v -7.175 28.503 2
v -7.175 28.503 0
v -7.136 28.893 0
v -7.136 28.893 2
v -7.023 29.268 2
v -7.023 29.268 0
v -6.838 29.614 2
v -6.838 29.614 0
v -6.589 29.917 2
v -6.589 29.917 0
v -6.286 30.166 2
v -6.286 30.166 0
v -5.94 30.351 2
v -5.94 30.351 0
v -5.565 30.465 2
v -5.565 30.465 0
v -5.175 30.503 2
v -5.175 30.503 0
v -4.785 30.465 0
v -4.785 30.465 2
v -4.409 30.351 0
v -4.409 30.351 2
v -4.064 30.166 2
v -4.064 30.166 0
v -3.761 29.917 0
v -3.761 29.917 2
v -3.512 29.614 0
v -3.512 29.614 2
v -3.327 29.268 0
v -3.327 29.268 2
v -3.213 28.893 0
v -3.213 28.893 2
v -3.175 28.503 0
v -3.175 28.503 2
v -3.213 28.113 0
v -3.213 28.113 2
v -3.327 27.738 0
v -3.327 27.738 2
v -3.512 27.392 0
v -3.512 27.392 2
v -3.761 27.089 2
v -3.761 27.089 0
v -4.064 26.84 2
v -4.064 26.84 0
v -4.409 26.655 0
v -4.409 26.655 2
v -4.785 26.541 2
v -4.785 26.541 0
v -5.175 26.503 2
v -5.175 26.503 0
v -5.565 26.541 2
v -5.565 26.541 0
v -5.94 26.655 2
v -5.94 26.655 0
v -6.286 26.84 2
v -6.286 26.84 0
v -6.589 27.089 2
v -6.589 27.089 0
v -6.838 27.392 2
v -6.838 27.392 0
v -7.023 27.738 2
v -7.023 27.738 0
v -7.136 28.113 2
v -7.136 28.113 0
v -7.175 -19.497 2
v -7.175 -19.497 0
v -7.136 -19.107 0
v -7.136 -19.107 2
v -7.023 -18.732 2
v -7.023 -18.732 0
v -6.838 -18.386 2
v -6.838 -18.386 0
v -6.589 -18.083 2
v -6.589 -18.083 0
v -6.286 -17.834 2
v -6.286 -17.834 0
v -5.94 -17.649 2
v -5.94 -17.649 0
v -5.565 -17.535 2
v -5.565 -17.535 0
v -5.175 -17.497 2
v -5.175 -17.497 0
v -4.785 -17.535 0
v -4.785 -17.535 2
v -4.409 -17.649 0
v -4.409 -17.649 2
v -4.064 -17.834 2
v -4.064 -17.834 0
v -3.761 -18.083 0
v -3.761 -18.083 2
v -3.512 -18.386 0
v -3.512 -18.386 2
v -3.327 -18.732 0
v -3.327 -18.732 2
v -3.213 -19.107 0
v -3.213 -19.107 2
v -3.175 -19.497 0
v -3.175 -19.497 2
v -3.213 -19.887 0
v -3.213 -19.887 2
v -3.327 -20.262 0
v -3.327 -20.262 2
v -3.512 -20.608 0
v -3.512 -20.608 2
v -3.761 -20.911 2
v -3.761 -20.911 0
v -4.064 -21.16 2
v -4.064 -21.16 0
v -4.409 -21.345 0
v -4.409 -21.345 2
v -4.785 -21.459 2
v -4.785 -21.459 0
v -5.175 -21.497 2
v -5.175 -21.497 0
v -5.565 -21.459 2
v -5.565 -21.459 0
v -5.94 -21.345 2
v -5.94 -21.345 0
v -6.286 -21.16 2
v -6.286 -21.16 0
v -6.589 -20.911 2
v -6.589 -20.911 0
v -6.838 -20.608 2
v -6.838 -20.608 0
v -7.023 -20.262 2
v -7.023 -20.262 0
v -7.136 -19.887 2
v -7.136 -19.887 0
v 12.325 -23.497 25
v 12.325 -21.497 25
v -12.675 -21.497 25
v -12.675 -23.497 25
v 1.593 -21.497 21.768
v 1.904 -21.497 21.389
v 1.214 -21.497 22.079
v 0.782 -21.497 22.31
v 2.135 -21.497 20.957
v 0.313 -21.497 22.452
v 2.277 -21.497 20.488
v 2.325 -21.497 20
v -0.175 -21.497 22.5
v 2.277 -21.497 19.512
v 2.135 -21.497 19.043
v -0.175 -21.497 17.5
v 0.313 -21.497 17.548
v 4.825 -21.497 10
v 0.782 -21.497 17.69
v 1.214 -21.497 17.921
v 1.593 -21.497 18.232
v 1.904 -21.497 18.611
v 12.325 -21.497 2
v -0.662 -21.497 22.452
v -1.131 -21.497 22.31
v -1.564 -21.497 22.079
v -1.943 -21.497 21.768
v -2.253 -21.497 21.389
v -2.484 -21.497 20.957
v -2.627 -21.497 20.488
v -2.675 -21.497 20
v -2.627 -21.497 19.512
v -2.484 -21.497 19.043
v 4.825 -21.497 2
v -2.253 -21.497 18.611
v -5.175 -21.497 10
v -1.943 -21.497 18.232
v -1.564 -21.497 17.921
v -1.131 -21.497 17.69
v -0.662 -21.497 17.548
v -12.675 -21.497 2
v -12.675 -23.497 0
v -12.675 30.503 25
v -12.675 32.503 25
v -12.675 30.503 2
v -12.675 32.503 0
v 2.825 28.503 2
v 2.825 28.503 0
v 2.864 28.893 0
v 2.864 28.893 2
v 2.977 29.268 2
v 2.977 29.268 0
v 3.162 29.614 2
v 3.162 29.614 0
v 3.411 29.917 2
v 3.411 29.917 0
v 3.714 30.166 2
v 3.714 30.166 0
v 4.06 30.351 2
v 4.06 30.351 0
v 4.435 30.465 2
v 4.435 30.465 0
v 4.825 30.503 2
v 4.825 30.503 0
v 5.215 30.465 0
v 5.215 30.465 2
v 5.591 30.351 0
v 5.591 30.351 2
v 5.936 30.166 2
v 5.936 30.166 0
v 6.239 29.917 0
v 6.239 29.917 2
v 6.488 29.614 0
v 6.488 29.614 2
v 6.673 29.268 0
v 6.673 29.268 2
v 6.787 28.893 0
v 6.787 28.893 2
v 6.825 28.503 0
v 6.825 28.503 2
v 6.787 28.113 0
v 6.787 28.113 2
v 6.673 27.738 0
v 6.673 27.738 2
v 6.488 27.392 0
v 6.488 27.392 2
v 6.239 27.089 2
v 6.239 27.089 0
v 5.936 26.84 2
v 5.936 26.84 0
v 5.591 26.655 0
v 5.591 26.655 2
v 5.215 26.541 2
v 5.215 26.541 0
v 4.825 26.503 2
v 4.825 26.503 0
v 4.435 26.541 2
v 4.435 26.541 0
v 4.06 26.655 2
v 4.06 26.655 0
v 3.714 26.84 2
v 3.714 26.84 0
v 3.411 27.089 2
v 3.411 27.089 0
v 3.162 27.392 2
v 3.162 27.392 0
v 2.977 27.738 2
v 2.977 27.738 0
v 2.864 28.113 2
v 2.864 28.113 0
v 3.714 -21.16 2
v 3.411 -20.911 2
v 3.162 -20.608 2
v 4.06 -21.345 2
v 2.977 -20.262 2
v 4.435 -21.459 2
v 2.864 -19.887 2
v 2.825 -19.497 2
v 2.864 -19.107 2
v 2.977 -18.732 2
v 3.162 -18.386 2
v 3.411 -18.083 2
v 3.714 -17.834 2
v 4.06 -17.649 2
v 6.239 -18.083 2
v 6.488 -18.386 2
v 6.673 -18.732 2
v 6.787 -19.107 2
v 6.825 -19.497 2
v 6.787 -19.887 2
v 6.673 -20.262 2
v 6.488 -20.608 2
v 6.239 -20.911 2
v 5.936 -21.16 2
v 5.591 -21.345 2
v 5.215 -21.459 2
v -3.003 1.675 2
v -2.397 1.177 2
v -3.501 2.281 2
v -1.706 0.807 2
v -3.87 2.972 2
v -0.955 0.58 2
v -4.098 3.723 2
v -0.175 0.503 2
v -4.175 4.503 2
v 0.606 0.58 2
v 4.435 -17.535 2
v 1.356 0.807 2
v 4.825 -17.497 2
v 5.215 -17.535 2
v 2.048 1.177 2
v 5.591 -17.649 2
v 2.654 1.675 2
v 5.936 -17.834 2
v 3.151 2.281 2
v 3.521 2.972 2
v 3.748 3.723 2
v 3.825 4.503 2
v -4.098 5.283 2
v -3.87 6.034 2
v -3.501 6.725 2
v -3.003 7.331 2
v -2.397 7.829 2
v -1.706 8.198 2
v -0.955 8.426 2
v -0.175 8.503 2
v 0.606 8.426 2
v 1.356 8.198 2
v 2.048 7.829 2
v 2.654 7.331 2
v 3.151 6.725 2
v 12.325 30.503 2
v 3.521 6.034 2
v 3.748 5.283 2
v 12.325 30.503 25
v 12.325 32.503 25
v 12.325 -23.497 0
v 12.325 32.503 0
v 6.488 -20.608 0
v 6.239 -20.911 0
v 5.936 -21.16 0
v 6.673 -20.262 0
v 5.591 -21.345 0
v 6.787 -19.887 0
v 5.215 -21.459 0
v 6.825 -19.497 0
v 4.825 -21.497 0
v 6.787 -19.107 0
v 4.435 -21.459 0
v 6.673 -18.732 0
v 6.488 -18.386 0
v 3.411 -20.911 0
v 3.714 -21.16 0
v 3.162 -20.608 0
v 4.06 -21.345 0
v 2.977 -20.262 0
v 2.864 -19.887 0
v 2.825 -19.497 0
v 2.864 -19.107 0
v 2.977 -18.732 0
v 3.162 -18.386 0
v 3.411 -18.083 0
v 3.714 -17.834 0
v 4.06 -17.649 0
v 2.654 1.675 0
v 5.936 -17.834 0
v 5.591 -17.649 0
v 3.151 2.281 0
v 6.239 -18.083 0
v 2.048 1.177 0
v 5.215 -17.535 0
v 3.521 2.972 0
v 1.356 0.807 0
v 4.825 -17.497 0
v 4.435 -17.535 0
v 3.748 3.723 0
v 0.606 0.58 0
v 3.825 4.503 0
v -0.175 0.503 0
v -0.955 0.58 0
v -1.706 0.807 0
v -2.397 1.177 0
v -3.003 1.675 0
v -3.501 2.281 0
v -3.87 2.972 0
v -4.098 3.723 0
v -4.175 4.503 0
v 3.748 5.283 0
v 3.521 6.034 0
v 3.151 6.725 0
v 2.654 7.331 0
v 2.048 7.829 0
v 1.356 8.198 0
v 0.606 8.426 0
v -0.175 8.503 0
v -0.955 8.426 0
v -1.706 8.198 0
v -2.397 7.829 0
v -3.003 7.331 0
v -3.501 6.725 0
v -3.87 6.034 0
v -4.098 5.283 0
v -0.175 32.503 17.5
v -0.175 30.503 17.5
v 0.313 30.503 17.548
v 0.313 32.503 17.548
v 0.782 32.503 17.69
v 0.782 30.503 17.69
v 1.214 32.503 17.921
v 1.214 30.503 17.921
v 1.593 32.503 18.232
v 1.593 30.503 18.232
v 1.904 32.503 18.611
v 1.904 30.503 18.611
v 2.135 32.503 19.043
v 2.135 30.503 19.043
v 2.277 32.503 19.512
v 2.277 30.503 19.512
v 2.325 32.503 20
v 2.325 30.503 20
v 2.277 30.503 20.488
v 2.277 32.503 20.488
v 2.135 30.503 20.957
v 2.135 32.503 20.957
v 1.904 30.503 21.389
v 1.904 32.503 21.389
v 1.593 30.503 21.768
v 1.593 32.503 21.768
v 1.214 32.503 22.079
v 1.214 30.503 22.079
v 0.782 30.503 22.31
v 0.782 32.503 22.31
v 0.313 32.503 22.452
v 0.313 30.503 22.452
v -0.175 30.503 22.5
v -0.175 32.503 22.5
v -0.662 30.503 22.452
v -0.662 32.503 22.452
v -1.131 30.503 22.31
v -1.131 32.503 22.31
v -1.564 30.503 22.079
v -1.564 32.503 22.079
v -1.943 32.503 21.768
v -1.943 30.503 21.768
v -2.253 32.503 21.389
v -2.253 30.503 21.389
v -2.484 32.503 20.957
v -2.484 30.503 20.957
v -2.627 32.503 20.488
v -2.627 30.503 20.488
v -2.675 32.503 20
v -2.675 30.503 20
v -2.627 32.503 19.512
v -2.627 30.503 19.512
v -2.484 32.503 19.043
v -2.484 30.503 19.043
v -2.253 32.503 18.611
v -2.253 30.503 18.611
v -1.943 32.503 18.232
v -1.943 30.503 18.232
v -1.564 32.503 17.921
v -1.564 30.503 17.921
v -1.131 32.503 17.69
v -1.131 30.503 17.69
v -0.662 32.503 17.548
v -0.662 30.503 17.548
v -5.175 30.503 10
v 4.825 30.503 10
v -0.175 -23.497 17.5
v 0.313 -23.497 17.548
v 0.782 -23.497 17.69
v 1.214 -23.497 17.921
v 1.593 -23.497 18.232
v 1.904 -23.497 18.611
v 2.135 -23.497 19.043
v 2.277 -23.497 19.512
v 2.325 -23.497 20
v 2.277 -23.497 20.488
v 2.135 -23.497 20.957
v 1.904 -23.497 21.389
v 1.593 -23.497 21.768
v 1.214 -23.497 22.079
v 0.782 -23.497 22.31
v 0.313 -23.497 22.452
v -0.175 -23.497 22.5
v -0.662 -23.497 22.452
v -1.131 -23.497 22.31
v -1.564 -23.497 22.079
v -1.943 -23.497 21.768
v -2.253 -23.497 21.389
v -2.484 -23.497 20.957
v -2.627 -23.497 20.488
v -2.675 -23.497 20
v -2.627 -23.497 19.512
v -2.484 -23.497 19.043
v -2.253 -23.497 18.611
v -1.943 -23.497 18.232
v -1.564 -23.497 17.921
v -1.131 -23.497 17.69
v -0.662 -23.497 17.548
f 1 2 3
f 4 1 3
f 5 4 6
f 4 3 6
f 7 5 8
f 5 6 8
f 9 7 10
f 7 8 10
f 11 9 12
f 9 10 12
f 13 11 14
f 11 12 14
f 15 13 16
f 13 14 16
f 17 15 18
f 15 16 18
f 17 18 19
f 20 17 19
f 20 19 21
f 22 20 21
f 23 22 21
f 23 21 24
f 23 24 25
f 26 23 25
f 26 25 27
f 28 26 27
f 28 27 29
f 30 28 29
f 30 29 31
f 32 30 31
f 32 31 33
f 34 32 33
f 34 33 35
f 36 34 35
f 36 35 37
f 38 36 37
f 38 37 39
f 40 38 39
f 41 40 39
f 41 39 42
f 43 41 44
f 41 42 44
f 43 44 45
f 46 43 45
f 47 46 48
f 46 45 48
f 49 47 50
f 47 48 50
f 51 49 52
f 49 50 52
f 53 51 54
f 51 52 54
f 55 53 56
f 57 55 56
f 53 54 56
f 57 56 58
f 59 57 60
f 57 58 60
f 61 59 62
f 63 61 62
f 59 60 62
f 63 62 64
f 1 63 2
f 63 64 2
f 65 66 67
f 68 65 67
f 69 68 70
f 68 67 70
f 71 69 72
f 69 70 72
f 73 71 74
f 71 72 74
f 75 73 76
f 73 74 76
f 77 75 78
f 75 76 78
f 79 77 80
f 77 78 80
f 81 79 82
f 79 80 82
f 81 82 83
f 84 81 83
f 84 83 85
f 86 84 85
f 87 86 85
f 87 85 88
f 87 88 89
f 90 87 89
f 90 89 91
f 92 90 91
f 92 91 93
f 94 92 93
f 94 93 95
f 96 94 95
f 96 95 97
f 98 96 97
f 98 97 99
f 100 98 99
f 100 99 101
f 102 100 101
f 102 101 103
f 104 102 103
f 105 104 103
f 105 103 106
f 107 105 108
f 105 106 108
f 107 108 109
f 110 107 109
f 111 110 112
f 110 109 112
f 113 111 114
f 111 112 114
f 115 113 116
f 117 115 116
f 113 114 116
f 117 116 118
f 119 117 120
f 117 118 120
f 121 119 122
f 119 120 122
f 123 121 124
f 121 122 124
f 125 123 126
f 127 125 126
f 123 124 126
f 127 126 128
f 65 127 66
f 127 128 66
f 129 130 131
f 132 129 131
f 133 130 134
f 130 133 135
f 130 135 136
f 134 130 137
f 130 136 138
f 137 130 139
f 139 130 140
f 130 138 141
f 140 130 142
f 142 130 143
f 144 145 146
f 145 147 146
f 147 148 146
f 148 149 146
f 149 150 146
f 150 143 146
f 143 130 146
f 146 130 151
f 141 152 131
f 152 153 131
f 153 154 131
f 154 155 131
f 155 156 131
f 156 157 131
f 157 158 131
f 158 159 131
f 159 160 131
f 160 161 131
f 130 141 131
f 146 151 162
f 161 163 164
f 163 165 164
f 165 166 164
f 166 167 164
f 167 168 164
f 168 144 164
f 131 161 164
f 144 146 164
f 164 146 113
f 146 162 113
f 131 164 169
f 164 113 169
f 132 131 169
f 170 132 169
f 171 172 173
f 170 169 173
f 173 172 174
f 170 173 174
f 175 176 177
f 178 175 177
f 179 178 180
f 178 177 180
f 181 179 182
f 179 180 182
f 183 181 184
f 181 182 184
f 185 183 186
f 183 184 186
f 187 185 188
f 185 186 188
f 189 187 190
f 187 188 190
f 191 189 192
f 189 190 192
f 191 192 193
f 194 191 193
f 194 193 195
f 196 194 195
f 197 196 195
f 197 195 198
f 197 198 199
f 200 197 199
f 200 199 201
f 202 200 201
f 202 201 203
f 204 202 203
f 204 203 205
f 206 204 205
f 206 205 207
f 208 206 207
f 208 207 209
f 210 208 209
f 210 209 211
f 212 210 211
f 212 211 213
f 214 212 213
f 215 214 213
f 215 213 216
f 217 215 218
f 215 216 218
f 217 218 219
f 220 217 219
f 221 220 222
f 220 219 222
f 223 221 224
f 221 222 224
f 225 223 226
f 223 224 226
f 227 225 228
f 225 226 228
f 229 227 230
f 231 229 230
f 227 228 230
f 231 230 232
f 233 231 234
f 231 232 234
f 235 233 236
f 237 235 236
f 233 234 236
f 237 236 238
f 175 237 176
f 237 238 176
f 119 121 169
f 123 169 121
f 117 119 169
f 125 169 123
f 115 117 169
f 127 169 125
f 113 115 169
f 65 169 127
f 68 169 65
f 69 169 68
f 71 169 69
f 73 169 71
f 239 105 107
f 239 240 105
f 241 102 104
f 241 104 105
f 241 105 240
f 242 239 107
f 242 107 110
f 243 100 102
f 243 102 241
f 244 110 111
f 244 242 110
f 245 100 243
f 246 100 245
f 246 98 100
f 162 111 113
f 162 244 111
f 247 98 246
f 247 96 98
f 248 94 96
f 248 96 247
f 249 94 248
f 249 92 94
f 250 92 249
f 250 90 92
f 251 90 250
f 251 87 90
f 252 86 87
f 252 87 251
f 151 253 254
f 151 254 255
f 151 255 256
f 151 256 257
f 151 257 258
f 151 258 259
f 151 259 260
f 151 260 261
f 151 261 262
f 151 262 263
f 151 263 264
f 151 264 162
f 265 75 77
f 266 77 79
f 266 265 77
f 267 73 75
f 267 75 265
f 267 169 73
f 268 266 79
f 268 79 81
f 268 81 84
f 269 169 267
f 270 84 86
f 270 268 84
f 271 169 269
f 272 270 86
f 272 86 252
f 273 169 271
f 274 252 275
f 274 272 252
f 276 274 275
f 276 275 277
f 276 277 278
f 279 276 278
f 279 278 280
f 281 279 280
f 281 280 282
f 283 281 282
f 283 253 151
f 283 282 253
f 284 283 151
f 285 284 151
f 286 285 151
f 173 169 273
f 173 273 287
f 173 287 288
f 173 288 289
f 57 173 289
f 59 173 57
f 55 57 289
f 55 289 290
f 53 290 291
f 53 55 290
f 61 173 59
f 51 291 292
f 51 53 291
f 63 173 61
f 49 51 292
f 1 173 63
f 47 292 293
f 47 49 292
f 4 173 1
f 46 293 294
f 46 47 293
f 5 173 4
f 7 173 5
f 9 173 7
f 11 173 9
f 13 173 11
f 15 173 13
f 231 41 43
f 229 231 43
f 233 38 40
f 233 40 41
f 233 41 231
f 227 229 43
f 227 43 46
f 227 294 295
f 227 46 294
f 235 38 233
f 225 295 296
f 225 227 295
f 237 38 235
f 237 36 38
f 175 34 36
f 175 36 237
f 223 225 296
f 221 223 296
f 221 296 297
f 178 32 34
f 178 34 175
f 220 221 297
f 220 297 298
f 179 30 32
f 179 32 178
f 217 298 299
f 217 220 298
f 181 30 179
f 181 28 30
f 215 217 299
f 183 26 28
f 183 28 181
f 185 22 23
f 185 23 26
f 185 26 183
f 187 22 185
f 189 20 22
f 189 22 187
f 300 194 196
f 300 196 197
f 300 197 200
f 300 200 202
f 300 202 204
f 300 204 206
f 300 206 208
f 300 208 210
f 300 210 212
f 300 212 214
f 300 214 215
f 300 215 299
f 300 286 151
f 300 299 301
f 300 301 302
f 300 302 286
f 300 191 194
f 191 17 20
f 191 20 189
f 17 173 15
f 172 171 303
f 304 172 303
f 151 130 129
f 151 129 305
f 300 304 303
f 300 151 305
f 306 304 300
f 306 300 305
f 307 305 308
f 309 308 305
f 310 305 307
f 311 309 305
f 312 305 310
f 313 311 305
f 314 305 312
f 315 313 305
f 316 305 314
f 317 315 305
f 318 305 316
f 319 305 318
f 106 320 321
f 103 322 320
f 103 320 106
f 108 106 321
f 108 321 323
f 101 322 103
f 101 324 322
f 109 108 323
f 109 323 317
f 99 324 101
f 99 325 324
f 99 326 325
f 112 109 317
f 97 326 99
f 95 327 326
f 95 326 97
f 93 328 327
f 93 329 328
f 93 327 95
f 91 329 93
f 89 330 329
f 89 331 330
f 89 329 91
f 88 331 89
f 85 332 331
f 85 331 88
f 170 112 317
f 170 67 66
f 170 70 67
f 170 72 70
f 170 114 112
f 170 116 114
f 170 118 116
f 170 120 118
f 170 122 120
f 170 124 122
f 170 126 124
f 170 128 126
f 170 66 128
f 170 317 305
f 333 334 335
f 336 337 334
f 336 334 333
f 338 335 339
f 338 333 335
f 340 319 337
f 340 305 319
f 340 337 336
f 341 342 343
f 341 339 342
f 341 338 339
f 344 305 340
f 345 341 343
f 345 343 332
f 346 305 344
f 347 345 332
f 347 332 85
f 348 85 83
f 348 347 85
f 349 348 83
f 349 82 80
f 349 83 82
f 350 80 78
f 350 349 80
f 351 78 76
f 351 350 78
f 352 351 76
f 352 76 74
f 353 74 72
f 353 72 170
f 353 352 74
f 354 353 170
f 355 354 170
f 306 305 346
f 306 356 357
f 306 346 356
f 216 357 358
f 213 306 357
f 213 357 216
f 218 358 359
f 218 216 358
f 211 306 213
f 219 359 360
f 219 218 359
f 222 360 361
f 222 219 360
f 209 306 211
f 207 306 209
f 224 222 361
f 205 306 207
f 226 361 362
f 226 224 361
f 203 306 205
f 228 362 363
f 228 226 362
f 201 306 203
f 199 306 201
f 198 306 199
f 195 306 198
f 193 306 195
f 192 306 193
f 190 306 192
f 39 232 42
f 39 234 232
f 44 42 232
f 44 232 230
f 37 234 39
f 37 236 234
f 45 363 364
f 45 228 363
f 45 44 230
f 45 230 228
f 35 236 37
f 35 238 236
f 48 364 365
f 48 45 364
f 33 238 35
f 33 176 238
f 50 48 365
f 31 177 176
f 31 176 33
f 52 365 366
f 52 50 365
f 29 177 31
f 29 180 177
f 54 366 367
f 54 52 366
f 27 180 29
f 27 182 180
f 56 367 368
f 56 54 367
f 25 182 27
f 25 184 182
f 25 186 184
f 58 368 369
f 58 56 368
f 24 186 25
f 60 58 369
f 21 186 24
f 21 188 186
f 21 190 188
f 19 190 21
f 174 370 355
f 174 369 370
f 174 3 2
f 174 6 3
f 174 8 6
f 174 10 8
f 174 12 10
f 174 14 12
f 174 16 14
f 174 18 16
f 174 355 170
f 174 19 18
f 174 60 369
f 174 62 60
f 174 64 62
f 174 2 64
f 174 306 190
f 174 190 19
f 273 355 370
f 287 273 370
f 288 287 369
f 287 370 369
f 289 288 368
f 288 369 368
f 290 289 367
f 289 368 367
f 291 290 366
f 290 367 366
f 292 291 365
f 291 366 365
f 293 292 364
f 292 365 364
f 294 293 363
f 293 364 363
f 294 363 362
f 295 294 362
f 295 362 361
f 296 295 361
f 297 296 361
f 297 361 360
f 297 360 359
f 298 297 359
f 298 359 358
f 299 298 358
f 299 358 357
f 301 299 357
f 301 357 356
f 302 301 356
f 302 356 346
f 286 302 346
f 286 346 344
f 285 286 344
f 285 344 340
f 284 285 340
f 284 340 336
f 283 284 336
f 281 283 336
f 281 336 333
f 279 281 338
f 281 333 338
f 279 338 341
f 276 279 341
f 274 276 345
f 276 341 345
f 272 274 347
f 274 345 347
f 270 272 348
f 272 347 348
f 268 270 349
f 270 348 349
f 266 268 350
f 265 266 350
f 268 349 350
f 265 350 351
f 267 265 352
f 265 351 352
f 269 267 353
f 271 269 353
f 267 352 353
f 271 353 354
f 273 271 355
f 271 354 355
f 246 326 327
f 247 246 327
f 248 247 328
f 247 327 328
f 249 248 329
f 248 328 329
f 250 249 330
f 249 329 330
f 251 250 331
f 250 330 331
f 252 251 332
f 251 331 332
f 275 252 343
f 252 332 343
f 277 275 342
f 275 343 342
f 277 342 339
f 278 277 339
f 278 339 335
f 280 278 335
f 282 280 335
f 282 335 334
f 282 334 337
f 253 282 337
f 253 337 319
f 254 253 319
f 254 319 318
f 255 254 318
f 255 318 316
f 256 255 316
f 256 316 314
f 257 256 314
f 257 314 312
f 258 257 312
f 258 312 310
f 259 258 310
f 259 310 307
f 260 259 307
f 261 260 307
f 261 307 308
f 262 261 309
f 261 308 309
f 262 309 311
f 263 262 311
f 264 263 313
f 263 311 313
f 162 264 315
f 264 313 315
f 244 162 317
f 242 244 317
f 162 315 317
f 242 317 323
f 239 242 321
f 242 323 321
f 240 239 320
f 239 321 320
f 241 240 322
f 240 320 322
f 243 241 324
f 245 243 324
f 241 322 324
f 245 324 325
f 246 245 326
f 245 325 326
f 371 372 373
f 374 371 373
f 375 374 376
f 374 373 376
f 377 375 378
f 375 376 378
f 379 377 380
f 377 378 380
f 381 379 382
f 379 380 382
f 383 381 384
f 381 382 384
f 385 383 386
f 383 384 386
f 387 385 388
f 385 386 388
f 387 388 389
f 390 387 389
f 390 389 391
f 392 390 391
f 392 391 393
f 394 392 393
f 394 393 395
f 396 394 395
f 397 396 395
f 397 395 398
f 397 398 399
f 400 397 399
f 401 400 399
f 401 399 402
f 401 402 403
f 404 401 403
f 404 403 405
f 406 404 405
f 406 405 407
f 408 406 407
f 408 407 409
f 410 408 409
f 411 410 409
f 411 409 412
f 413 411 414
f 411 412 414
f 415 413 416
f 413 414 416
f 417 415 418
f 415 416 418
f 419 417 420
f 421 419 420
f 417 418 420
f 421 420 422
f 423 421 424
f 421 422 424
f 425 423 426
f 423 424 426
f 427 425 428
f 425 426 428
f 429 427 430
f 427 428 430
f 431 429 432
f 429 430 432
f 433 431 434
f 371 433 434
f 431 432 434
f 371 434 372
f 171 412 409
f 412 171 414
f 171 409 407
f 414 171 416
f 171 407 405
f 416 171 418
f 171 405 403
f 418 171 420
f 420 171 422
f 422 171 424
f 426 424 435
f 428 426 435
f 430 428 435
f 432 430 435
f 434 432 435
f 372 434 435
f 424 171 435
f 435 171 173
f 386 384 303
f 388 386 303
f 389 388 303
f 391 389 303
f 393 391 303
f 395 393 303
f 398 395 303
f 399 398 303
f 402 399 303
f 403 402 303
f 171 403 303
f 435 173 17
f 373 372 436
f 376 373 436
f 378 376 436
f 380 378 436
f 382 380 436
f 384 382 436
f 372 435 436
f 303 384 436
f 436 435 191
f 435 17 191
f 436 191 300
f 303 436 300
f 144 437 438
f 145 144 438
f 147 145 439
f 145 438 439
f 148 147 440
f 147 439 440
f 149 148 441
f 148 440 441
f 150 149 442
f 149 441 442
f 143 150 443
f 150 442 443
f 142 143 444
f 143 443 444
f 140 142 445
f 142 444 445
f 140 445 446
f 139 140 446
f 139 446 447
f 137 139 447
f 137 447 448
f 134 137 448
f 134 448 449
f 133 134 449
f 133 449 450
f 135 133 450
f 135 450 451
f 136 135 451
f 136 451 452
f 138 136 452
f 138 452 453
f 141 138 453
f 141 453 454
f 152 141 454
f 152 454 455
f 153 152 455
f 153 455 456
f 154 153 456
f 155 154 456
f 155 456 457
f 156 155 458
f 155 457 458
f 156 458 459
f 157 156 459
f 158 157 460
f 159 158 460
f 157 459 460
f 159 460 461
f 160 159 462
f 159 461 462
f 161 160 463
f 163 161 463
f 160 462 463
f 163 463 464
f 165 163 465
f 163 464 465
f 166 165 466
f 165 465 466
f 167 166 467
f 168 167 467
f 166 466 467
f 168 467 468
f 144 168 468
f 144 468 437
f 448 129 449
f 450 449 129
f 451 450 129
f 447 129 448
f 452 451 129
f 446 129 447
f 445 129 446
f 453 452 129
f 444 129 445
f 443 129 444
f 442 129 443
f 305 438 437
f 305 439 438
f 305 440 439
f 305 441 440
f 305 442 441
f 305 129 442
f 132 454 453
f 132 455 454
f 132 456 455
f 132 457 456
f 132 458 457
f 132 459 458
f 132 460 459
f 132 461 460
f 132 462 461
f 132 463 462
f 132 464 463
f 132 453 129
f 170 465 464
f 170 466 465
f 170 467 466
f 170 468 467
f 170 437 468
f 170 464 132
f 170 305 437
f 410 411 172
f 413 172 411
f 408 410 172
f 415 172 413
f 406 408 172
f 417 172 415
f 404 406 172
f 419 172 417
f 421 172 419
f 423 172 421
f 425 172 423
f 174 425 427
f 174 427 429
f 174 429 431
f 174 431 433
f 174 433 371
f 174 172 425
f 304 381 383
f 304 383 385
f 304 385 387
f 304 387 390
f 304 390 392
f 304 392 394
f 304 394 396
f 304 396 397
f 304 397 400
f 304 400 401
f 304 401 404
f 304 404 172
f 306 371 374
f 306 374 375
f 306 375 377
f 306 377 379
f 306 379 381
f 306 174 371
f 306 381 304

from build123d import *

# Parameters (mm, degrees)
SKETCH1_W           = 25
SKETCH1_H           = 52
BOSS_EXTRUDE1_DEPTH = 2
SKETCH2_W           = 25
SKETCH2_H           = 25
BOSS_EXTRUDE2_DEPTH = 2
SKETCH3_W           = 25
SKETCH3_H           = 25
BOSS_EXTRUDE3_DEPTH = 2
SKETCH5_R           = 4
CUT_EXTRUDE2_DEPTH  = 21
SKETCH7_R           = 2.5
CUT_EXTRUDE4_DEPTH  = 84
SKETCH8_R           = 2
CUT_EXTRUDE5_DEPTH  = 10


with BuildPart() as part:
    # Sketch1 → Boss-Extrude1 (new body)
    with BuildSketch(Plane.XY):
        with Locations((-0.174770451, 4.502942624)):
            Rectangle(SKETCH1_W, SKETCH1_H)
    extrude(amount=BOSS_EXTRUDE1_DEPTH)

    # Sketch2 → Boss-Extrude2 (add)
    with BuildSketch(Plane(origin=(0, 30.502942624, 0), x_dir=(1, 0, 0), z_dir=(0, 1, 0))):
        with Locations((-0.174770451, -12.5)):
            Rectangle(SKETCH2_W, SKETCH2_H)
    extrude(amount=BOSS_EXTRUDE2_DEPTH)

    # Sketch3 → Boss-Extrude3 (add)
    with BuildSketch(Plane(origin=(0, -21.497057376, 0), x_dir=(-1, 0, 0), z_dir=(0, -1, 0))):
        with Locations((0.174770451, -12.5)):
            Rectangle(SKETCH3_W, SKETCH3_H)
    extrude(amount=BOSS_EXTRUDE3_DEPTH)

    # Sketch5 → Cut-Extrude2 (cut)
    with BuildSketch(Plane(origin=(0, 0, 0), x_dir=(-1, 0, 0), z_dir=(0, 0, -1))):
        with Locations((0.174770451, 4.502942624)):
            Circle(SKETCH5_R)
    extrude(amount=-CUT_EXTRUDE2_DEPTH, mode=Mode.SUBTRACT)

    # Sketch7 → Cut-Extrude4 (cut)
    with BuildSketch(Plane(origin=(0, -23.497057376, 0), x_dir=(-1, 0, 0), z_dir=(0, -1, 0))):
        with Locations(Location((0.174770451, -20, 0), (0, 0, 90))):
            Circle(SKETCH7_R)
    extrude(amount=-CUT_EXTRUDE4_DEPTH, mode=Mode.SUBTRACT)

    # Sketch8 → Cut-Extrude5 (cut)
    with BuildSketch(Plane(origin=(0, 0, 0), x_dir=(-1, 0, 0), z_dir=(0, 0, -1))):
        with Locations((5.174770451, -19.497057376)):
            Circle(SKETCH8_R)
        with Locations((-4.825229549, -19.497057376)):
            Circle(SKETCH8_R)
        with Locations((-4.825229549, 28.502942624)):
            Circle(SKETCH8_R)
        with Locations((5.174770451, 28.502942624)):
            Circle(SKETCH8_R)
    extrude(amount=-CUT_EXTRUDE5_DEPTH, mode=Mode.SUBTRACT)


solid = part.part
